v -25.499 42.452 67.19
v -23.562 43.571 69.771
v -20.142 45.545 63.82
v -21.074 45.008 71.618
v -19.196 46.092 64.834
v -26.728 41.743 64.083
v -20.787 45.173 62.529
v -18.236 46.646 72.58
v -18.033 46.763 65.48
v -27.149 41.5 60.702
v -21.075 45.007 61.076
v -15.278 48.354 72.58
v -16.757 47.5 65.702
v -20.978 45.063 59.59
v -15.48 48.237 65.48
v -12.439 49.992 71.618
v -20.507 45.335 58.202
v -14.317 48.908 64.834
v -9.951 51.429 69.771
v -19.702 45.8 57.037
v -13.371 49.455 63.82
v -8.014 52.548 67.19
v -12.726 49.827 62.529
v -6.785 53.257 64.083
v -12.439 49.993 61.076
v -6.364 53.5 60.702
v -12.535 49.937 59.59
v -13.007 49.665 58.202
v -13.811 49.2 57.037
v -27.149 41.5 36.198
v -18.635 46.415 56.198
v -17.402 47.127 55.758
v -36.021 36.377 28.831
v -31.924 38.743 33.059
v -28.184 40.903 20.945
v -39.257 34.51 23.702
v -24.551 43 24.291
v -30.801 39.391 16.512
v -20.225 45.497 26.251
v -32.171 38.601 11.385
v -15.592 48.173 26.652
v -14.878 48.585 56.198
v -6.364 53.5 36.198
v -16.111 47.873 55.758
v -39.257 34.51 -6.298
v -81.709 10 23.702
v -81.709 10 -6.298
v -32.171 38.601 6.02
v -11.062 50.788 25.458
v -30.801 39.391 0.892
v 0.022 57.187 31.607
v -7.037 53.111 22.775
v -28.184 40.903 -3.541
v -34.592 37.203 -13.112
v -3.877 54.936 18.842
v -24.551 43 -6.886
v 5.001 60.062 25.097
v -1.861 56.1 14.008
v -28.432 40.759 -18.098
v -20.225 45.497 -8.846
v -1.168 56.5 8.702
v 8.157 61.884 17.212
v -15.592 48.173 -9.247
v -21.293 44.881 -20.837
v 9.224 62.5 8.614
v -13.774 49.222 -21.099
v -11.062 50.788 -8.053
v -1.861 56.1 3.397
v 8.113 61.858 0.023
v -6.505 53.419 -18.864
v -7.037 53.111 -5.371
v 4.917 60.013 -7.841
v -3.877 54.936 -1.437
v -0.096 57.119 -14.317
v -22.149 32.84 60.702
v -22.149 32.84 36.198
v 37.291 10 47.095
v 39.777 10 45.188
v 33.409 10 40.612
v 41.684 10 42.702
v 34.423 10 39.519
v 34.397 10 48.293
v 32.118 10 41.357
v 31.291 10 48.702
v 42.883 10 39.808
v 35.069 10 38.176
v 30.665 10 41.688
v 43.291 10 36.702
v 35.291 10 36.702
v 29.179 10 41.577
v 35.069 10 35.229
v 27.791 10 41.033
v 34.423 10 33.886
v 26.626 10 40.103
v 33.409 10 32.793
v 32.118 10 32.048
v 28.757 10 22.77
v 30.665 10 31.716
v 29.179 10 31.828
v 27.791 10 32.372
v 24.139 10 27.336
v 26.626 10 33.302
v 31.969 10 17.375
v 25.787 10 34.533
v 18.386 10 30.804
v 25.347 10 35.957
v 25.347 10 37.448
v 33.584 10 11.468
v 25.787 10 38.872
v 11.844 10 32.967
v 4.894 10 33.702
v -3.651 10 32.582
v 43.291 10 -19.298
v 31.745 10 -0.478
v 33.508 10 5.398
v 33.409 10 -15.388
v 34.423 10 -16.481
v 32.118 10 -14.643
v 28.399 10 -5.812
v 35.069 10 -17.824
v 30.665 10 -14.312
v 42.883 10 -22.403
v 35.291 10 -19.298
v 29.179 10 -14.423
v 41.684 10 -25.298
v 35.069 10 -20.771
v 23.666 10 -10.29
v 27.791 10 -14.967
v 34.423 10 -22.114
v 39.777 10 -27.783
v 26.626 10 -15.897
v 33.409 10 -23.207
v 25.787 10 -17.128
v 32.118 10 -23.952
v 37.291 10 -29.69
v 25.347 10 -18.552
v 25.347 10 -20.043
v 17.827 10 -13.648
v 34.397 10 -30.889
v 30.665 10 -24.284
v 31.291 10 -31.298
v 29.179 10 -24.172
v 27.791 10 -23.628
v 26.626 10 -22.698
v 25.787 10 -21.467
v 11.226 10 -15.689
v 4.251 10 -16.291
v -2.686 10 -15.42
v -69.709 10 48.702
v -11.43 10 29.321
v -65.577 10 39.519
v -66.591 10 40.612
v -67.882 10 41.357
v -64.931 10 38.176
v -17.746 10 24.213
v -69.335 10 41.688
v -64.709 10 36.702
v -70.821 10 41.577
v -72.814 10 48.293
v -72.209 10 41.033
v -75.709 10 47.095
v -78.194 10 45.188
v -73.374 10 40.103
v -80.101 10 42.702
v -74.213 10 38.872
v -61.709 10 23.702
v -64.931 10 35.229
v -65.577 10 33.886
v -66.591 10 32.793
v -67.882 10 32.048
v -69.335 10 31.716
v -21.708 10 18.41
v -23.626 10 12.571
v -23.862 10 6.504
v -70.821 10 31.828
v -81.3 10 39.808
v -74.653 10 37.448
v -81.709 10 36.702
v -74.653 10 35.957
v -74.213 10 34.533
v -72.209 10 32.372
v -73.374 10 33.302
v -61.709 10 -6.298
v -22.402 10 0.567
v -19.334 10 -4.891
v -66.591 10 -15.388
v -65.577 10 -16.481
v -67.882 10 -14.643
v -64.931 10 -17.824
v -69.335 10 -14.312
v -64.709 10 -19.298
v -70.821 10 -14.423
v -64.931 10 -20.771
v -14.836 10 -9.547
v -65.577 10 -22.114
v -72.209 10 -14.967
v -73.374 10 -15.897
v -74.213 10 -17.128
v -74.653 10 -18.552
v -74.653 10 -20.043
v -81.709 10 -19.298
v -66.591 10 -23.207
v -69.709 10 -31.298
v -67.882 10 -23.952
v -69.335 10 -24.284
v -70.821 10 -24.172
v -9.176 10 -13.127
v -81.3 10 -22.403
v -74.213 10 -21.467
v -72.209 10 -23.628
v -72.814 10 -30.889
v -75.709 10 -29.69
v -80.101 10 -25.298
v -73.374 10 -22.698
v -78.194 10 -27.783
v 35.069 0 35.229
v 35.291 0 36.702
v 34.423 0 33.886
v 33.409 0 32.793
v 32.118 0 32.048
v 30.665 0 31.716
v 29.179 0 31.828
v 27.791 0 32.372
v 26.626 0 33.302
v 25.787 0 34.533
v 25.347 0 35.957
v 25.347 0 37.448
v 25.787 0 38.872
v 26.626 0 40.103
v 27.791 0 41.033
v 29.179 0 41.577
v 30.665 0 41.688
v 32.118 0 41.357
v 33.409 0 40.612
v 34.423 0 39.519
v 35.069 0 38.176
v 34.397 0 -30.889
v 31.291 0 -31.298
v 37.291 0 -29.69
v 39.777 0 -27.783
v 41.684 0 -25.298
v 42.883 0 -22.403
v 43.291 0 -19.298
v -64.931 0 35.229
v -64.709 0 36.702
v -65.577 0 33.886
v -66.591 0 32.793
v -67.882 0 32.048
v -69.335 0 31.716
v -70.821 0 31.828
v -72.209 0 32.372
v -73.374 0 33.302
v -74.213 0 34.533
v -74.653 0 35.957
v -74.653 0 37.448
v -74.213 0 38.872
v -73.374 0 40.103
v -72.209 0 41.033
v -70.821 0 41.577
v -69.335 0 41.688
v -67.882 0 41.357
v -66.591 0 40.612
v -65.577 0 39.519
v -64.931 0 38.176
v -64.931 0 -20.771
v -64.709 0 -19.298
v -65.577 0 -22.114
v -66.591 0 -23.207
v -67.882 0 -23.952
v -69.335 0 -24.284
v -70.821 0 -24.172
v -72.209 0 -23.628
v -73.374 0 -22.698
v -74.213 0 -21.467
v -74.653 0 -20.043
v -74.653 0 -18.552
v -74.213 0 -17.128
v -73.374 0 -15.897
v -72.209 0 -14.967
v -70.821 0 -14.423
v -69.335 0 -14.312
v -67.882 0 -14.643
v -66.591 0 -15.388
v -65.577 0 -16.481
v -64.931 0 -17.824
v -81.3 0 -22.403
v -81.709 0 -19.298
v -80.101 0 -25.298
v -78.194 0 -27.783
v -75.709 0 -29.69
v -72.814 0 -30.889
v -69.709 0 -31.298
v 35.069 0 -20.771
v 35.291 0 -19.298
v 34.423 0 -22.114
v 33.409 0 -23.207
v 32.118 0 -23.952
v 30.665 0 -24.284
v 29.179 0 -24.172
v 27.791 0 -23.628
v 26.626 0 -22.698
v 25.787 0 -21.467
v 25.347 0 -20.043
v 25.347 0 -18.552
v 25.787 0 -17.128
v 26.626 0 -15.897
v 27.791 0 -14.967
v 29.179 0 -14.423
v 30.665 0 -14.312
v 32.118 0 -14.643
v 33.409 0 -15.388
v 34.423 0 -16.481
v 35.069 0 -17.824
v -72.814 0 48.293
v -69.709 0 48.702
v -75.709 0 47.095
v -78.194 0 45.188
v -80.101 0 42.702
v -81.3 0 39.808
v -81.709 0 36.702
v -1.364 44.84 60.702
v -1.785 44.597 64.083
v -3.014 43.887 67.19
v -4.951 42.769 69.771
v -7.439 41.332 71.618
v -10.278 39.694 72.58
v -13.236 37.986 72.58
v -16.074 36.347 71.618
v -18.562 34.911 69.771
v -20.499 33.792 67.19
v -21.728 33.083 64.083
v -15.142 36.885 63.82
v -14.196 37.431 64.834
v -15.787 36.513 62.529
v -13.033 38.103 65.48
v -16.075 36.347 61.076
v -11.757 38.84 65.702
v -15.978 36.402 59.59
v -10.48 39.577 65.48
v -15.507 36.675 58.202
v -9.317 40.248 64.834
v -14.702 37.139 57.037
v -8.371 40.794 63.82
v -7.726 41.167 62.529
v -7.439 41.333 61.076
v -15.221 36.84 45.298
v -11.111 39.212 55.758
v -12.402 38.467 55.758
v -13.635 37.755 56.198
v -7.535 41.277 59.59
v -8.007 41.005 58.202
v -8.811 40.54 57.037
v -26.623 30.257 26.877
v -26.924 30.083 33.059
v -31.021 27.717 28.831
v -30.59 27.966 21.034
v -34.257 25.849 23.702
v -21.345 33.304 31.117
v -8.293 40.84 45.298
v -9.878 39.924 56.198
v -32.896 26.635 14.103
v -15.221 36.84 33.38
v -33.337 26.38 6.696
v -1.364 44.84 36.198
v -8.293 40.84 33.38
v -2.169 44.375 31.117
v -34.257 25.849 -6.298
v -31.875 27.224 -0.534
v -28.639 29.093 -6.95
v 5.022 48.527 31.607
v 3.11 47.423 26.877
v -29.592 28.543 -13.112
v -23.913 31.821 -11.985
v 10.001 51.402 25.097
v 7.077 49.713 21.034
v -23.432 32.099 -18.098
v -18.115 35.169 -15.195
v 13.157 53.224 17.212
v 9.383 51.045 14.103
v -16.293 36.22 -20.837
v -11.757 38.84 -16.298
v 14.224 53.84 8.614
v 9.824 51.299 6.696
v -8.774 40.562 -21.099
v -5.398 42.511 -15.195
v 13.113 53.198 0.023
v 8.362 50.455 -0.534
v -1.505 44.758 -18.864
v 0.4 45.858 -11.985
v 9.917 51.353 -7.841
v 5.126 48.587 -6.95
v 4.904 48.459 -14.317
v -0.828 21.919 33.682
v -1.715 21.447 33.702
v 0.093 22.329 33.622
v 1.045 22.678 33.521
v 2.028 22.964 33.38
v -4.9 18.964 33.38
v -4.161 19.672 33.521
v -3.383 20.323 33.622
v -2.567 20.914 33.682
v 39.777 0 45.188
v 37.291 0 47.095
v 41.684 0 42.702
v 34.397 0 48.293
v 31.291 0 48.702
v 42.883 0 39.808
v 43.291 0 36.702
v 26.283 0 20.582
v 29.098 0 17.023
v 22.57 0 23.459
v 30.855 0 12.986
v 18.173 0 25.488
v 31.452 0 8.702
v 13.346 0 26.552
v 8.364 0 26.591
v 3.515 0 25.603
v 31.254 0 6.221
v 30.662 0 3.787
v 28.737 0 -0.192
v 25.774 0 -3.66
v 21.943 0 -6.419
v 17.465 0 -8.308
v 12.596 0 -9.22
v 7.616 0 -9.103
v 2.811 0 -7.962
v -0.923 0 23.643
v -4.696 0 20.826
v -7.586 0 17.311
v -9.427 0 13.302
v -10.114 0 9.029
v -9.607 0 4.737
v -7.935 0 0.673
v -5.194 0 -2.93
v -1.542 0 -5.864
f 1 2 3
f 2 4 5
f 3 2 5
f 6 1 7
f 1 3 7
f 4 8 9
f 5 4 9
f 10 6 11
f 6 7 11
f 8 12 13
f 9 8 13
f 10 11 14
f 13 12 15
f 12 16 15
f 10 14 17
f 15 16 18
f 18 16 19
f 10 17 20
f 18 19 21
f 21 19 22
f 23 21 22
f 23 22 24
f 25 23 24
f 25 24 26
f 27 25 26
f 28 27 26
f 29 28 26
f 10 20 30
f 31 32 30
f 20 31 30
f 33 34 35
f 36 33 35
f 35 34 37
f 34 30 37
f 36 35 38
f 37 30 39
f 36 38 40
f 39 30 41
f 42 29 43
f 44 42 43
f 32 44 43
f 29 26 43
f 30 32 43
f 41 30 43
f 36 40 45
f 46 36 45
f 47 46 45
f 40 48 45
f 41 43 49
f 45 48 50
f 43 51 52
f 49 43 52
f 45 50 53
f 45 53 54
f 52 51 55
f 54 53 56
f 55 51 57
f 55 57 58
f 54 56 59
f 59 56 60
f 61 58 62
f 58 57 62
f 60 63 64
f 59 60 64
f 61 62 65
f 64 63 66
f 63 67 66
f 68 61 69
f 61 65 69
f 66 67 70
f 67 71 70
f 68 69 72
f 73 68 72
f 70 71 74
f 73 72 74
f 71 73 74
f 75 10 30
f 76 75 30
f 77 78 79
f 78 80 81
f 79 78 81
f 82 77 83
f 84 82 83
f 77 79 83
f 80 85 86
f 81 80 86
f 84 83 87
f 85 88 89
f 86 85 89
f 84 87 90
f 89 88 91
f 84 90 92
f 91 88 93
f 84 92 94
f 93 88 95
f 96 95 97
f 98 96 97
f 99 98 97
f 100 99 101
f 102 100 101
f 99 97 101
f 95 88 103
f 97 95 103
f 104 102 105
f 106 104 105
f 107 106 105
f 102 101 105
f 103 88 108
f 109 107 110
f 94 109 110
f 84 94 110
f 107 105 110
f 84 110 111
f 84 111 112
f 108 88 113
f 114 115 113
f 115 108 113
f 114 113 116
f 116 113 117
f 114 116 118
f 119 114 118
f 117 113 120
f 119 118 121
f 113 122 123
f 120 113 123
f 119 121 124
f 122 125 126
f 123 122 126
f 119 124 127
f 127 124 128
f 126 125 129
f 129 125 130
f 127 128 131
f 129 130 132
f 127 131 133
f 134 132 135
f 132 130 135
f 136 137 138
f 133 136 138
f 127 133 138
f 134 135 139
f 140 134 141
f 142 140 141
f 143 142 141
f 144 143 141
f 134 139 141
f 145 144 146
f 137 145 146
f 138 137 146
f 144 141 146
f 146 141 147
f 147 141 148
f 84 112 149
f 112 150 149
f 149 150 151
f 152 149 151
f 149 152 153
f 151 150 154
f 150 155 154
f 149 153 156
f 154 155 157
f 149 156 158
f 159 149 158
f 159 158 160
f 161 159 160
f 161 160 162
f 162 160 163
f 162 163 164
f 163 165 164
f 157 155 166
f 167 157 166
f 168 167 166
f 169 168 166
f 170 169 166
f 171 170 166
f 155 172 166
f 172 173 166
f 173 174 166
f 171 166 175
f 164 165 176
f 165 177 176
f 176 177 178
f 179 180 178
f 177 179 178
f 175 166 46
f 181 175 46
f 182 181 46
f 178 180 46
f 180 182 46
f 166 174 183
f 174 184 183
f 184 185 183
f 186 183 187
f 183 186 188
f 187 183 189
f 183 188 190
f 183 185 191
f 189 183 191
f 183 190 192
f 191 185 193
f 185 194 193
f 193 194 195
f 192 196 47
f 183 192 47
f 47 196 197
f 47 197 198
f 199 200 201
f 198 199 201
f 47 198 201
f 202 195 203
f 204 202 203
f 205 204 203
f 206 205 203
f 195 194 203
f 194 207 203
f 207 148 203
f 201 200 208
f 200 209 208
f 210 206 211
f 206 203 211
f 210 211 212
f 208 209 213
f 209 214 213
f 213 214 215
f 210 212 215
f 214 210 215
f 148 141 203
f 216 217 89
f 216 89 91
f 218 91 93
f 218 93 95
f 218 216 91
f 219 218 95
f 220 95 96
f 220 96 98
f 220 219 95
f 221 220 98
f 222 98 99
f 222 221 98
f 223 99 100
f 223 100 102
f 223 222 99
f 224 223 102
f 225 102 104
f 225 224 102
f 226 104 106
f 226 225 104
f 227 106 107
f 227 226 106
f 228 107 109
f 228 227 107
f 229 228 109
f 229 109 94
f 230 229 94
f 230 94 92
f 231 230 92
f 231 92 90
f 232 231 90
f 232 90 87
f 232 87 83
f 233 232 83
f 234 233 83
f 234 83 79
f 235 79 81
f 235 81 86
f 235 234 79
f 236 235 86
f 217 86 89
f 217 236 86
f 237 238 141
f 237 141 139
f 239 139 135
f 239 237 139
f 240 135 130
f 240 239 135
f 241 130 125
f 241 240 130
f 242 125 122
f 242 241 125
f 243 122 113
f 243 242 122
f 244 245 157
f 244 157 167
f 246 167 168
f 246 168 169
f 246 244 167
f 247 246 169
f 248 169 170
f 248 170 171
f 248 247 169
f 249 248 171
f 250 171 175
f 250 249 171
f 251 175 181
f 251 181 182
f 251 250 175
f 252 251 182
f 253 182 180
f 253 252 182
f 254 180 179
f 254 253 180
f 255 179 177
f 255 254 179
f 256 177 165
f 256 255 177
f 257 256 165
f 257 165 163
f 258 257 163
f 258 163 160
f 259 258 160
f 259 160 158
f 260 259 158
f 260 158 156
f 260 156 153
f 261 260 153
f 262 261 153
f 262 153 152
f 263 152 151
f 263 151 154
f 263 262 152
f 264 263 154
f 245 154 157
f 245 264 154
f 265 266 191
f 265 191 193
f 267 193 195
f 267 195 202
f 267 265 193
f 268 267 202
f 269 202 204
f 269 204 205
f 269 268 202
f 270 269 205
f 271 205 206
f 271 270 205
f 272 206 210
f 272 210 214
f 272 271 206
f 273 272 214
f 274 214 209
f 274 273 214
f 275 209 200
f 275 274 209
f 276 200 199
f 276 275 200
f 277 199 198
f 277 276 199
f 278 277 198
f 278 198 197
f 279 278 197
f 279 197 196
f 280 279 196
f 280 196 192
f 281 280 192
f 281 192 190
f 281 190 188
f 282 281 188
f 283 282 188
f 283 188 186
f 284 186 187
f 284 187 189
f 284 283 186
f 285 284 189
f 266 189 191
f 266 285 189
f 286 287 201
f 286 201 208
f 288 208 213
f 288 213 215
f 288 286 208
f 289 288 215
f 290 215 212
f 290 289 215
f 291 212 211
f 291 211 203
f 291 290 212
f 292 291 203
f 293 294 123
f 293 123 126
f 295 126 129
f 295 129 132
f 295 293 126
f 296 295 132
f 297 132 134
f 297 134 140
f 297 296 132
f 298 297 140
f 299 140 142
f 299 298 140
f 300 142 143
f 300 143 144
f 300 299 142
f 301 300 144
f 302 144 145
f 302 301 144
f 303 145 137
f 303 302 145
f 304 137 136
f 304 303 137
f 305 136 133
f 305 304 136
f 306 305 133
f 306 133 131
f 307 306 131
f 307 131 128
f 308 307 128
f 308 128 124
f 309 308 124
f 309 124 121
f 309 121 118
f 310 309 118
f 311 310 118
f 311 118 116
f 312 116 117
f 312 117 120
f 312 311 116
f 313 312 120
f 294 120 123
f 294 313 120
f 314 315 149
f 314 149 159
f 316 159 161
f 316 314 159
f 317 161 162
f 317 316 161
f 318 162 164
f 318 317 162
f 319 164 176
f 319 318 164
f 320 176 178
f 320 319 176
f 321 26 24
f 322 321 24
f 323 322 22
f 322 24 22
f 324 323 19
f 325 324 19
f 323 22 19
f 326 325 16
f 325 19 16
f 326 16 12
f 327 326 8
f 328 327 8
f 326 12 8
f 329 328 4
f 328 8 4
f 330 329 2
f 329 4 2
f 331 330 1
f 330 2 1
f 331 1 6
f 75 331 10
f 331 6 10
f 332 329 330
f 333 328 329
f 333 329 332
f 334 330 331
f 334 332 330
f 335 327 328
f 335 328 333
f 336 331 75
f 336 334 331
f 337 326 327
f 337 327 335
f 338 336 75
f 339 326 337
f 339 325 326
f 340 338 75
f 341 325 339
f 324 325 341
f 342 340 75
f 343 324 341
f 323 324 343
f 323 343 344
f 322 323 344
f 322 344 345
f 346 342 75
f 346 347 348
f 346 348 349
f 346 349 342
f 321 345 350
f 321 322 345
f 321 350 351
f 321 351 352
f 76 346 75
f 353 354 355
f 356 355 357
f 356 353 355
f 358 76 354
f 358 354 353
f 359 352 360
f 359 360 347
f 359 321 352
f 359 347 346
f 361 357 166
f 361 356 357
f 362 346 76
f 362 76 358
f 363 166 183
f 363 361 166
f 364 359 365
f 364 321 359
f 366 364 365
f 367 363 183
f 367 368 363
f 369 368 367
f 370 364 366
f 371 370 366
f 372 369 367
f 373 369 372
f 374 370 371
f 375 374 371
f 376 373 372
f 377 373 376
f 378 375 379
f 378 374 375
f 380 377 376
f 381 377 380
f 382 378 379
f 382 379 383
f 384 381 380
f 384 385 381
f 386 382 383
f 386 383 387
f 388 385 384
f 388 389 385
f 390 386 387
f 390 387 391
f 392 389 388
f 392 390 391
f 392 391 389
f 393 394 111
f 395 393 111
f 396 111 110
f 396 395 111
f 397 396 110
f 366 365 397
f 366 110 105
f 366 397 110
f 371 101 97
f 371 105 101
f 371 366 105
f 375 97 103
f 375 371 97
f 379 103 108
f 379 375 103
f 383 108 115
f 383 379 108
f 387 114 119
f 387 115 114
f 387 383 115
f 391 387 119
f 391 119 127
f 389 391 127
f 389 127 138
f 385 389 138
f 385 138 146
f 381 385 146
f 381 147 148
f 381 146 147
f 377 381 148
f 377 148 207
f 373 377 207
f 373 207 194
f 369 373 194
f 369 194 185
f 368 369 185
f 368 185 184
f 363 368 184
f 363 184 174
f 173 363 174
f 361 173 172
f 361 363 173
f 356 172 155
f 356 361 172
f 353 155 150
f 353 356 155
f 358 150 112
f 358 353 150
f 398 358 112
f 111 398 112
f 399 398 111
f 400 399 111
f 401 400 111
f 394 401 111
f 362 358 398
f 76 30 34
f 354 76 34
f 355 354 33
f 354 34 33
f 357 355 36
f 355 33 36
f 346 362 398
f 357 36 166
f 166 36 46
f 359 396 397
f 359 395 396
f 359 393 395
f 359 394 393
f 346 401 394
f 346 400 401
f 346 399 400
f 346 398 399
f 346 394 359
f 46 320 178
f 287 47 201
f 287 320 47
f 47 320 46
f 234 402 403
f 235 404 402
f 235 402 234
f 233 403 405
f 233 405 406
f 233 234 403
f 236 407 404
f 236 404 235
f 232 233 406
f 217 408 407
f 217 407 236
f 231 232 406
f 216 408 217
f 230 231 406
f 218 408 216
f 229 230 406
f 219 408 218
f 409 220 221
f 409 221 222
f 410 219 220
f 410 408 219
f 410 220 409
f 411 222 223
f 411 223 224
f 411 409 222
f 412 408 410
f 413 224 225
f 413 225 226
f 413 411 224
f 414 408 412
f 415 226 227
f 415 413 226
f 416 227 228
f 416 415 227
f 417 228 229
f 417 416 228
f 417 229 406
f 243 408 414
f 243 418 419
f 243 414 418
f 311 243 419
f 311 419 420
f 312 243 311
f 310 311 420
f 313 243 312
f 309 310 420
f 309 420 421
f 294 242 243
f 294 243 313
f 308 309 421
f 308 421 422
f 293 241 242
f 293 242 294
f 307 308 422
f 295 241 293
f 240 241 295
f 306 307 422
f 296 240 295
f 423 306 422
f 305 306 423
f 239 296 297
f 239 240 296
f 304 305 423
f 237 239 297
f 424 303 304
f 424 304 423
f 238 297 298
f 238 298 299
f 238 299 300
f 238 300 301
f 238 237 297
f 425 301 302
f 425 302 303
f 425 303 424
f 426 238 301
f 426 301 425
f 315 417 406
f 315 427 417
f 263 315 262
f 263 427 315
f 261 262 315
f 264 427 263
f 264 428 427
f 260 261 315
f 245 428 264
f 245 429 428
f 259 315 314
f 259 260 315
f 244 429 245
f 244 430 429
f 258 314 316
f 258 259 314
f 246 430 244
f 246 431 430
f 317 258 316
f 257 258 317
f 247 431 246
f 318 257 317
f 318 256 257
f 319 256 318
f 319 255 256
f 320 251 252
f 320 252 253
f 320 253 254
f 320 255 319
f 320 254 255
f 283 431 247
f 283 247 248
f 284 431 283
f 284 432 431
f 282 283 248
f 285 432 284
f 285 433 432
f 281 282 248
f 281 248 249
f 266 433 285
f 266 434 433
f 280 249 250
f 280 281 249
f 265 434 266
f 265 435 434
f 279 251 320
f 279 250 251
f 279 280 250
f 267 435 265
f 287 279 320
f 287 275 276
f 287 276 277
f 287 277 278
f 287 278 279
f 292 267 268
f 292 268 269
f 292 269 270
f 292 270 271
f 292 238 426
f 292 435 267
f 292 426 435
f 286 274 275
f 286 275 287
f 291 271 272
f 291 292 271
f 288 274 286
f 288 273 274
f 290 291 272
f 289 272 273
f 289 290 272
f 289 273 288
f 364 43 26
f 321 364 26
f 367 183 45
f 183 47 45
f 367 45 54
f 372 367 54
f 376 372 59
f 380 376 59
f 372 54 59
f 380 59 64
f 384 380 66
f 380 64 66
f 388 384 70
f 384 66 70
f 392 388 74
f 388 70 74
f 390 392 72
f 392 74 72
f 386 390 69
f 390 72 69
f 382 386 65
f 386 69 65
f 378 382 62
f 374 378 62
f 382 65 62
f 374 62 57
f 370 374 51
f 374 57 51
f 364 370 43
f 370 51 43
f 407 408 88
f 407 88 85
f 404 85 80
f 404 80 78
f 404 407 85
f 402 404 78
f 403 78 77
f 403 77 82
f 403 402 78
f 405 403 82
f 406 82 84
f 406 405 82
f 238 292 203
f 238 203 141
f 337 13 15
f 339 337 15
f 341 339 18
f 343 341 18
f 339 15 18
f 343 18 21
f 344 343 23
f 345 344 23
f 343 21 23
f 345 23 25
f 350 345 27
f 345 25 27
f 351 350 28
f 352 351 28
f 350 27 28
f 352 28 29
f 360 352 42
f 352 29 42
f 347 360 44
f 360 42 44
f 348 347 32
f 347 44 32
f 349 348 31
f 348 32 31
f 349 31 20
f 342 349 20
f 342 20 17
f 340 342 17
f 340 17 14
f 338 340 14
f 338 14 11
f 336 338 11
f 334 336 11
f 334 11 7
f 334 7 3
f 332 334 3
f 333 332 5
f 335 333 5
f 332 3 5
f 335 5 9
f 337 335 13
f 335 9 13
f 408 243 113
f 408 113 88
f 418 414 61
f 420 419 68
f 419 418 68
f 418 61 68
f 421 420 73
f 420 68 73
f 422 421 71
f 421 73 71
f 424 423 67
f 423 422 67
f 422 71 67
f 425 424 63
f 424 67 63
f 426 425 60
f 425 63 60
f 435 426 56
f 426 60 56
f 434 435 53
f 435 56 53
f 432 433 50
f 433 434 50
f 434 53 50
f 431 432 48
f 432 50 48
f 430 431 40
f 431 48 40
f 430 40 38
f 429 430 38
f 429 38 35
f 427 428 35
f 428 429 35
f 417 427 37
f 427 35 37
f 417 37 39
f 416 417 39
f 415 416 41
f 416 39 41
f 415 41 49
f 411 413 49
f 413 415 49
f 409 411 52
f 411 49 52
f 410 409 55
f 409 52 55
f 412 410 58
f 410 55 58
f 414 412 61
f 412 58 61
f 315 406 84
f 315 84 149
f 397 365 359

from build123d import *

# Parameters (mm, degrees)
SKETCH_1_R          = 5
EXTRUDE_1_DEPTH     = 10
SKETCH_3_R          = 5
SKETCH_3_R_2        = 18
EXTRUDE_3_DEPTH     = 10
EXTRUDE_4_REACH     = 73.16
SKETCH_4_R          = 25
SKETCH_5_R          = 18
CUT_EXTRUDE_1_DEPTH = 72.160254038
EXTRUDE_6_DEPTH     = 4


with BuildPart() as part:
    # 草图1 → 凸台-拉伸1 (new body)
    with BuildSketch(Plane(origin=(0, 0, 0), x_dir=(1, 0, 0), z_dir=(0, 1, 0))):
        with BuildLine():
            Line((-69.708508874, 31.297621281), (31.291491126, 31.297621281))
            ThreePointArc((31.291491126, 31.297621281), (39.7767725, 27.782902656), (43.291491126, 19.297621281))
            Line((43.291491126, 19.297621281), (43.291491126, -36.702378719))
            ThreePointArc((43.291491126, -36.702378719), (39.7767725, -45.187660093), (31.291491126, -48.702378719))
            Line((31.291491126, -48.702378719), (-69.708508874, -48.702378719))
            ThreePointArc((-69.708508874, -48.702378719), (-78.193790248, -45.187660093), (-81.708508874, -36.702378719))
            Line((-81.708508874, -36.702378719), (-81.708508874, 19.297621281))
            ThreePointArc((-81.708508874, 19.297621281), (-78.193790248, 27.782902656), (-69.708508874, 31.297621281))
        make_face()
        with Locations((-69.708508874, -36.702378719)):
            Circle(SKETCH_1_R, mode=Mode.SUBTRACT)
        with Locations((30.291491126, -36.702378719)):
            Circle(SKETCH_1_R, mode=Mode.SUBTRACT)
        with Locations((30.291491126, 19.297621281)):
            Circle(SKETCH_1_R, mode=Mode.SUBTRACT)
        with Locations((-69.708508874, 19.297621281)):
            Circle(SKETCH_1_R, mode=Mode.SUBTRACT)
    extrude(amount=EXTRUDE_1_DEPTH)

    # 草图3 → 凸台-拉伸3 (add)
    with BuildSketch(Plane(origin=(-24.757254237, 42.880822195, 0), x_dir=(0, 0, 1), z_dir=(-0.5, 0.866025404, 0))):
        with BuildLine():
            Line((-6.297621281, -65.76164439), (-6.297621281, -16.742406504))
            ThreePointArc((-6.297621281, -16.742406504), (-11.289336226, 31.606443002), (36.197832888, 21.23835561))
            Line((36.197832888, 21.23835561), (60.702378719, 21.23835561))
            ThreePointArc((60.702378719, 21.23835561), (72.702378719, 9.23835561), (60.702378719, -2.76164439))
            Line((60.702378719, -2.76164439), (36.197832888, -2.76164439))
            ThreePointArc((36.197832888, -2.76164439), (31.070466111, -10.753359335), (23.702378719, -16.742406504))
            Line((23.702378719, -16.742406504), (23.702378719, -65.76164439))
            Line((23.702378719, -65.76164439), (-6.297621281, -65.76164439))
        make_face()
        with Locations((60.702378719, 9.23835561)):
            Circle(SKETCH_3_R, mode=Mode.SUBTRACT)
        with Locations((8.702378719, 9.23835561)):
            Circle(SKETCH_3_R_2, mode=Mode.SUBTRACT)
    extrude(amount=-EXTRUDE_3_DEPTH)

    # 草图4 → 凸台-拉伸4 (add, up to next)
    with BuildSketch(Plane(origin=(-24.757254237, 42.880822195, 0), x_dir=(0, 0, 1), z_dir=(-0.5, 0.866025404, 0)), mode=Mode.PRIVATE) as extrude_4_sk1:
        with Locations((8.702378719, 9.23835561)):
            Circle(SKETCH_4_R)
    extrude_4_tool1 = extrude(extrude_4_sk1.sketch, amount=-EXTRUDE_4_REACH, mode=Mode.PRIVATE) - part.part
    add(extrude_4_tool1.solids().sort_by_distance((-16.756604, 47.5, 8.702379))[0])

    # 草图5 → 切除-拉伸1 (cut, through all)
    with BuildSketch(Plane(origin=(-24.757254237, 42.880822195, 0), x_dir=(0.866025404, 0.5, 0), z_dir=(-0.5, 0.866025404, 0))):
        with Locations((9.23835561, -8.702378719)):
            Circle(SKETCH_5_R)
    extrude(amount=-CUT_EXTRUDE_1_DEPTH, mode=Mode.SUBTRACT)

    # 草图7 → 凸台-拉伸6 (add, symmetric)
    with BuildSketch(Plane(origin=(8.000650647, 4.619177805, 0), x_dir=(0, 0, 1), z_dir=(-0.866025404, -0.5, 0))):
        Polygon((45.297720901, 39.514508475), (30.011923646, 39.514508475), (30.472342637, 13.83620008), align=None)
    extrude(amount=EXTRUDE_6_DEPTH, both=True)


solid = part.part
